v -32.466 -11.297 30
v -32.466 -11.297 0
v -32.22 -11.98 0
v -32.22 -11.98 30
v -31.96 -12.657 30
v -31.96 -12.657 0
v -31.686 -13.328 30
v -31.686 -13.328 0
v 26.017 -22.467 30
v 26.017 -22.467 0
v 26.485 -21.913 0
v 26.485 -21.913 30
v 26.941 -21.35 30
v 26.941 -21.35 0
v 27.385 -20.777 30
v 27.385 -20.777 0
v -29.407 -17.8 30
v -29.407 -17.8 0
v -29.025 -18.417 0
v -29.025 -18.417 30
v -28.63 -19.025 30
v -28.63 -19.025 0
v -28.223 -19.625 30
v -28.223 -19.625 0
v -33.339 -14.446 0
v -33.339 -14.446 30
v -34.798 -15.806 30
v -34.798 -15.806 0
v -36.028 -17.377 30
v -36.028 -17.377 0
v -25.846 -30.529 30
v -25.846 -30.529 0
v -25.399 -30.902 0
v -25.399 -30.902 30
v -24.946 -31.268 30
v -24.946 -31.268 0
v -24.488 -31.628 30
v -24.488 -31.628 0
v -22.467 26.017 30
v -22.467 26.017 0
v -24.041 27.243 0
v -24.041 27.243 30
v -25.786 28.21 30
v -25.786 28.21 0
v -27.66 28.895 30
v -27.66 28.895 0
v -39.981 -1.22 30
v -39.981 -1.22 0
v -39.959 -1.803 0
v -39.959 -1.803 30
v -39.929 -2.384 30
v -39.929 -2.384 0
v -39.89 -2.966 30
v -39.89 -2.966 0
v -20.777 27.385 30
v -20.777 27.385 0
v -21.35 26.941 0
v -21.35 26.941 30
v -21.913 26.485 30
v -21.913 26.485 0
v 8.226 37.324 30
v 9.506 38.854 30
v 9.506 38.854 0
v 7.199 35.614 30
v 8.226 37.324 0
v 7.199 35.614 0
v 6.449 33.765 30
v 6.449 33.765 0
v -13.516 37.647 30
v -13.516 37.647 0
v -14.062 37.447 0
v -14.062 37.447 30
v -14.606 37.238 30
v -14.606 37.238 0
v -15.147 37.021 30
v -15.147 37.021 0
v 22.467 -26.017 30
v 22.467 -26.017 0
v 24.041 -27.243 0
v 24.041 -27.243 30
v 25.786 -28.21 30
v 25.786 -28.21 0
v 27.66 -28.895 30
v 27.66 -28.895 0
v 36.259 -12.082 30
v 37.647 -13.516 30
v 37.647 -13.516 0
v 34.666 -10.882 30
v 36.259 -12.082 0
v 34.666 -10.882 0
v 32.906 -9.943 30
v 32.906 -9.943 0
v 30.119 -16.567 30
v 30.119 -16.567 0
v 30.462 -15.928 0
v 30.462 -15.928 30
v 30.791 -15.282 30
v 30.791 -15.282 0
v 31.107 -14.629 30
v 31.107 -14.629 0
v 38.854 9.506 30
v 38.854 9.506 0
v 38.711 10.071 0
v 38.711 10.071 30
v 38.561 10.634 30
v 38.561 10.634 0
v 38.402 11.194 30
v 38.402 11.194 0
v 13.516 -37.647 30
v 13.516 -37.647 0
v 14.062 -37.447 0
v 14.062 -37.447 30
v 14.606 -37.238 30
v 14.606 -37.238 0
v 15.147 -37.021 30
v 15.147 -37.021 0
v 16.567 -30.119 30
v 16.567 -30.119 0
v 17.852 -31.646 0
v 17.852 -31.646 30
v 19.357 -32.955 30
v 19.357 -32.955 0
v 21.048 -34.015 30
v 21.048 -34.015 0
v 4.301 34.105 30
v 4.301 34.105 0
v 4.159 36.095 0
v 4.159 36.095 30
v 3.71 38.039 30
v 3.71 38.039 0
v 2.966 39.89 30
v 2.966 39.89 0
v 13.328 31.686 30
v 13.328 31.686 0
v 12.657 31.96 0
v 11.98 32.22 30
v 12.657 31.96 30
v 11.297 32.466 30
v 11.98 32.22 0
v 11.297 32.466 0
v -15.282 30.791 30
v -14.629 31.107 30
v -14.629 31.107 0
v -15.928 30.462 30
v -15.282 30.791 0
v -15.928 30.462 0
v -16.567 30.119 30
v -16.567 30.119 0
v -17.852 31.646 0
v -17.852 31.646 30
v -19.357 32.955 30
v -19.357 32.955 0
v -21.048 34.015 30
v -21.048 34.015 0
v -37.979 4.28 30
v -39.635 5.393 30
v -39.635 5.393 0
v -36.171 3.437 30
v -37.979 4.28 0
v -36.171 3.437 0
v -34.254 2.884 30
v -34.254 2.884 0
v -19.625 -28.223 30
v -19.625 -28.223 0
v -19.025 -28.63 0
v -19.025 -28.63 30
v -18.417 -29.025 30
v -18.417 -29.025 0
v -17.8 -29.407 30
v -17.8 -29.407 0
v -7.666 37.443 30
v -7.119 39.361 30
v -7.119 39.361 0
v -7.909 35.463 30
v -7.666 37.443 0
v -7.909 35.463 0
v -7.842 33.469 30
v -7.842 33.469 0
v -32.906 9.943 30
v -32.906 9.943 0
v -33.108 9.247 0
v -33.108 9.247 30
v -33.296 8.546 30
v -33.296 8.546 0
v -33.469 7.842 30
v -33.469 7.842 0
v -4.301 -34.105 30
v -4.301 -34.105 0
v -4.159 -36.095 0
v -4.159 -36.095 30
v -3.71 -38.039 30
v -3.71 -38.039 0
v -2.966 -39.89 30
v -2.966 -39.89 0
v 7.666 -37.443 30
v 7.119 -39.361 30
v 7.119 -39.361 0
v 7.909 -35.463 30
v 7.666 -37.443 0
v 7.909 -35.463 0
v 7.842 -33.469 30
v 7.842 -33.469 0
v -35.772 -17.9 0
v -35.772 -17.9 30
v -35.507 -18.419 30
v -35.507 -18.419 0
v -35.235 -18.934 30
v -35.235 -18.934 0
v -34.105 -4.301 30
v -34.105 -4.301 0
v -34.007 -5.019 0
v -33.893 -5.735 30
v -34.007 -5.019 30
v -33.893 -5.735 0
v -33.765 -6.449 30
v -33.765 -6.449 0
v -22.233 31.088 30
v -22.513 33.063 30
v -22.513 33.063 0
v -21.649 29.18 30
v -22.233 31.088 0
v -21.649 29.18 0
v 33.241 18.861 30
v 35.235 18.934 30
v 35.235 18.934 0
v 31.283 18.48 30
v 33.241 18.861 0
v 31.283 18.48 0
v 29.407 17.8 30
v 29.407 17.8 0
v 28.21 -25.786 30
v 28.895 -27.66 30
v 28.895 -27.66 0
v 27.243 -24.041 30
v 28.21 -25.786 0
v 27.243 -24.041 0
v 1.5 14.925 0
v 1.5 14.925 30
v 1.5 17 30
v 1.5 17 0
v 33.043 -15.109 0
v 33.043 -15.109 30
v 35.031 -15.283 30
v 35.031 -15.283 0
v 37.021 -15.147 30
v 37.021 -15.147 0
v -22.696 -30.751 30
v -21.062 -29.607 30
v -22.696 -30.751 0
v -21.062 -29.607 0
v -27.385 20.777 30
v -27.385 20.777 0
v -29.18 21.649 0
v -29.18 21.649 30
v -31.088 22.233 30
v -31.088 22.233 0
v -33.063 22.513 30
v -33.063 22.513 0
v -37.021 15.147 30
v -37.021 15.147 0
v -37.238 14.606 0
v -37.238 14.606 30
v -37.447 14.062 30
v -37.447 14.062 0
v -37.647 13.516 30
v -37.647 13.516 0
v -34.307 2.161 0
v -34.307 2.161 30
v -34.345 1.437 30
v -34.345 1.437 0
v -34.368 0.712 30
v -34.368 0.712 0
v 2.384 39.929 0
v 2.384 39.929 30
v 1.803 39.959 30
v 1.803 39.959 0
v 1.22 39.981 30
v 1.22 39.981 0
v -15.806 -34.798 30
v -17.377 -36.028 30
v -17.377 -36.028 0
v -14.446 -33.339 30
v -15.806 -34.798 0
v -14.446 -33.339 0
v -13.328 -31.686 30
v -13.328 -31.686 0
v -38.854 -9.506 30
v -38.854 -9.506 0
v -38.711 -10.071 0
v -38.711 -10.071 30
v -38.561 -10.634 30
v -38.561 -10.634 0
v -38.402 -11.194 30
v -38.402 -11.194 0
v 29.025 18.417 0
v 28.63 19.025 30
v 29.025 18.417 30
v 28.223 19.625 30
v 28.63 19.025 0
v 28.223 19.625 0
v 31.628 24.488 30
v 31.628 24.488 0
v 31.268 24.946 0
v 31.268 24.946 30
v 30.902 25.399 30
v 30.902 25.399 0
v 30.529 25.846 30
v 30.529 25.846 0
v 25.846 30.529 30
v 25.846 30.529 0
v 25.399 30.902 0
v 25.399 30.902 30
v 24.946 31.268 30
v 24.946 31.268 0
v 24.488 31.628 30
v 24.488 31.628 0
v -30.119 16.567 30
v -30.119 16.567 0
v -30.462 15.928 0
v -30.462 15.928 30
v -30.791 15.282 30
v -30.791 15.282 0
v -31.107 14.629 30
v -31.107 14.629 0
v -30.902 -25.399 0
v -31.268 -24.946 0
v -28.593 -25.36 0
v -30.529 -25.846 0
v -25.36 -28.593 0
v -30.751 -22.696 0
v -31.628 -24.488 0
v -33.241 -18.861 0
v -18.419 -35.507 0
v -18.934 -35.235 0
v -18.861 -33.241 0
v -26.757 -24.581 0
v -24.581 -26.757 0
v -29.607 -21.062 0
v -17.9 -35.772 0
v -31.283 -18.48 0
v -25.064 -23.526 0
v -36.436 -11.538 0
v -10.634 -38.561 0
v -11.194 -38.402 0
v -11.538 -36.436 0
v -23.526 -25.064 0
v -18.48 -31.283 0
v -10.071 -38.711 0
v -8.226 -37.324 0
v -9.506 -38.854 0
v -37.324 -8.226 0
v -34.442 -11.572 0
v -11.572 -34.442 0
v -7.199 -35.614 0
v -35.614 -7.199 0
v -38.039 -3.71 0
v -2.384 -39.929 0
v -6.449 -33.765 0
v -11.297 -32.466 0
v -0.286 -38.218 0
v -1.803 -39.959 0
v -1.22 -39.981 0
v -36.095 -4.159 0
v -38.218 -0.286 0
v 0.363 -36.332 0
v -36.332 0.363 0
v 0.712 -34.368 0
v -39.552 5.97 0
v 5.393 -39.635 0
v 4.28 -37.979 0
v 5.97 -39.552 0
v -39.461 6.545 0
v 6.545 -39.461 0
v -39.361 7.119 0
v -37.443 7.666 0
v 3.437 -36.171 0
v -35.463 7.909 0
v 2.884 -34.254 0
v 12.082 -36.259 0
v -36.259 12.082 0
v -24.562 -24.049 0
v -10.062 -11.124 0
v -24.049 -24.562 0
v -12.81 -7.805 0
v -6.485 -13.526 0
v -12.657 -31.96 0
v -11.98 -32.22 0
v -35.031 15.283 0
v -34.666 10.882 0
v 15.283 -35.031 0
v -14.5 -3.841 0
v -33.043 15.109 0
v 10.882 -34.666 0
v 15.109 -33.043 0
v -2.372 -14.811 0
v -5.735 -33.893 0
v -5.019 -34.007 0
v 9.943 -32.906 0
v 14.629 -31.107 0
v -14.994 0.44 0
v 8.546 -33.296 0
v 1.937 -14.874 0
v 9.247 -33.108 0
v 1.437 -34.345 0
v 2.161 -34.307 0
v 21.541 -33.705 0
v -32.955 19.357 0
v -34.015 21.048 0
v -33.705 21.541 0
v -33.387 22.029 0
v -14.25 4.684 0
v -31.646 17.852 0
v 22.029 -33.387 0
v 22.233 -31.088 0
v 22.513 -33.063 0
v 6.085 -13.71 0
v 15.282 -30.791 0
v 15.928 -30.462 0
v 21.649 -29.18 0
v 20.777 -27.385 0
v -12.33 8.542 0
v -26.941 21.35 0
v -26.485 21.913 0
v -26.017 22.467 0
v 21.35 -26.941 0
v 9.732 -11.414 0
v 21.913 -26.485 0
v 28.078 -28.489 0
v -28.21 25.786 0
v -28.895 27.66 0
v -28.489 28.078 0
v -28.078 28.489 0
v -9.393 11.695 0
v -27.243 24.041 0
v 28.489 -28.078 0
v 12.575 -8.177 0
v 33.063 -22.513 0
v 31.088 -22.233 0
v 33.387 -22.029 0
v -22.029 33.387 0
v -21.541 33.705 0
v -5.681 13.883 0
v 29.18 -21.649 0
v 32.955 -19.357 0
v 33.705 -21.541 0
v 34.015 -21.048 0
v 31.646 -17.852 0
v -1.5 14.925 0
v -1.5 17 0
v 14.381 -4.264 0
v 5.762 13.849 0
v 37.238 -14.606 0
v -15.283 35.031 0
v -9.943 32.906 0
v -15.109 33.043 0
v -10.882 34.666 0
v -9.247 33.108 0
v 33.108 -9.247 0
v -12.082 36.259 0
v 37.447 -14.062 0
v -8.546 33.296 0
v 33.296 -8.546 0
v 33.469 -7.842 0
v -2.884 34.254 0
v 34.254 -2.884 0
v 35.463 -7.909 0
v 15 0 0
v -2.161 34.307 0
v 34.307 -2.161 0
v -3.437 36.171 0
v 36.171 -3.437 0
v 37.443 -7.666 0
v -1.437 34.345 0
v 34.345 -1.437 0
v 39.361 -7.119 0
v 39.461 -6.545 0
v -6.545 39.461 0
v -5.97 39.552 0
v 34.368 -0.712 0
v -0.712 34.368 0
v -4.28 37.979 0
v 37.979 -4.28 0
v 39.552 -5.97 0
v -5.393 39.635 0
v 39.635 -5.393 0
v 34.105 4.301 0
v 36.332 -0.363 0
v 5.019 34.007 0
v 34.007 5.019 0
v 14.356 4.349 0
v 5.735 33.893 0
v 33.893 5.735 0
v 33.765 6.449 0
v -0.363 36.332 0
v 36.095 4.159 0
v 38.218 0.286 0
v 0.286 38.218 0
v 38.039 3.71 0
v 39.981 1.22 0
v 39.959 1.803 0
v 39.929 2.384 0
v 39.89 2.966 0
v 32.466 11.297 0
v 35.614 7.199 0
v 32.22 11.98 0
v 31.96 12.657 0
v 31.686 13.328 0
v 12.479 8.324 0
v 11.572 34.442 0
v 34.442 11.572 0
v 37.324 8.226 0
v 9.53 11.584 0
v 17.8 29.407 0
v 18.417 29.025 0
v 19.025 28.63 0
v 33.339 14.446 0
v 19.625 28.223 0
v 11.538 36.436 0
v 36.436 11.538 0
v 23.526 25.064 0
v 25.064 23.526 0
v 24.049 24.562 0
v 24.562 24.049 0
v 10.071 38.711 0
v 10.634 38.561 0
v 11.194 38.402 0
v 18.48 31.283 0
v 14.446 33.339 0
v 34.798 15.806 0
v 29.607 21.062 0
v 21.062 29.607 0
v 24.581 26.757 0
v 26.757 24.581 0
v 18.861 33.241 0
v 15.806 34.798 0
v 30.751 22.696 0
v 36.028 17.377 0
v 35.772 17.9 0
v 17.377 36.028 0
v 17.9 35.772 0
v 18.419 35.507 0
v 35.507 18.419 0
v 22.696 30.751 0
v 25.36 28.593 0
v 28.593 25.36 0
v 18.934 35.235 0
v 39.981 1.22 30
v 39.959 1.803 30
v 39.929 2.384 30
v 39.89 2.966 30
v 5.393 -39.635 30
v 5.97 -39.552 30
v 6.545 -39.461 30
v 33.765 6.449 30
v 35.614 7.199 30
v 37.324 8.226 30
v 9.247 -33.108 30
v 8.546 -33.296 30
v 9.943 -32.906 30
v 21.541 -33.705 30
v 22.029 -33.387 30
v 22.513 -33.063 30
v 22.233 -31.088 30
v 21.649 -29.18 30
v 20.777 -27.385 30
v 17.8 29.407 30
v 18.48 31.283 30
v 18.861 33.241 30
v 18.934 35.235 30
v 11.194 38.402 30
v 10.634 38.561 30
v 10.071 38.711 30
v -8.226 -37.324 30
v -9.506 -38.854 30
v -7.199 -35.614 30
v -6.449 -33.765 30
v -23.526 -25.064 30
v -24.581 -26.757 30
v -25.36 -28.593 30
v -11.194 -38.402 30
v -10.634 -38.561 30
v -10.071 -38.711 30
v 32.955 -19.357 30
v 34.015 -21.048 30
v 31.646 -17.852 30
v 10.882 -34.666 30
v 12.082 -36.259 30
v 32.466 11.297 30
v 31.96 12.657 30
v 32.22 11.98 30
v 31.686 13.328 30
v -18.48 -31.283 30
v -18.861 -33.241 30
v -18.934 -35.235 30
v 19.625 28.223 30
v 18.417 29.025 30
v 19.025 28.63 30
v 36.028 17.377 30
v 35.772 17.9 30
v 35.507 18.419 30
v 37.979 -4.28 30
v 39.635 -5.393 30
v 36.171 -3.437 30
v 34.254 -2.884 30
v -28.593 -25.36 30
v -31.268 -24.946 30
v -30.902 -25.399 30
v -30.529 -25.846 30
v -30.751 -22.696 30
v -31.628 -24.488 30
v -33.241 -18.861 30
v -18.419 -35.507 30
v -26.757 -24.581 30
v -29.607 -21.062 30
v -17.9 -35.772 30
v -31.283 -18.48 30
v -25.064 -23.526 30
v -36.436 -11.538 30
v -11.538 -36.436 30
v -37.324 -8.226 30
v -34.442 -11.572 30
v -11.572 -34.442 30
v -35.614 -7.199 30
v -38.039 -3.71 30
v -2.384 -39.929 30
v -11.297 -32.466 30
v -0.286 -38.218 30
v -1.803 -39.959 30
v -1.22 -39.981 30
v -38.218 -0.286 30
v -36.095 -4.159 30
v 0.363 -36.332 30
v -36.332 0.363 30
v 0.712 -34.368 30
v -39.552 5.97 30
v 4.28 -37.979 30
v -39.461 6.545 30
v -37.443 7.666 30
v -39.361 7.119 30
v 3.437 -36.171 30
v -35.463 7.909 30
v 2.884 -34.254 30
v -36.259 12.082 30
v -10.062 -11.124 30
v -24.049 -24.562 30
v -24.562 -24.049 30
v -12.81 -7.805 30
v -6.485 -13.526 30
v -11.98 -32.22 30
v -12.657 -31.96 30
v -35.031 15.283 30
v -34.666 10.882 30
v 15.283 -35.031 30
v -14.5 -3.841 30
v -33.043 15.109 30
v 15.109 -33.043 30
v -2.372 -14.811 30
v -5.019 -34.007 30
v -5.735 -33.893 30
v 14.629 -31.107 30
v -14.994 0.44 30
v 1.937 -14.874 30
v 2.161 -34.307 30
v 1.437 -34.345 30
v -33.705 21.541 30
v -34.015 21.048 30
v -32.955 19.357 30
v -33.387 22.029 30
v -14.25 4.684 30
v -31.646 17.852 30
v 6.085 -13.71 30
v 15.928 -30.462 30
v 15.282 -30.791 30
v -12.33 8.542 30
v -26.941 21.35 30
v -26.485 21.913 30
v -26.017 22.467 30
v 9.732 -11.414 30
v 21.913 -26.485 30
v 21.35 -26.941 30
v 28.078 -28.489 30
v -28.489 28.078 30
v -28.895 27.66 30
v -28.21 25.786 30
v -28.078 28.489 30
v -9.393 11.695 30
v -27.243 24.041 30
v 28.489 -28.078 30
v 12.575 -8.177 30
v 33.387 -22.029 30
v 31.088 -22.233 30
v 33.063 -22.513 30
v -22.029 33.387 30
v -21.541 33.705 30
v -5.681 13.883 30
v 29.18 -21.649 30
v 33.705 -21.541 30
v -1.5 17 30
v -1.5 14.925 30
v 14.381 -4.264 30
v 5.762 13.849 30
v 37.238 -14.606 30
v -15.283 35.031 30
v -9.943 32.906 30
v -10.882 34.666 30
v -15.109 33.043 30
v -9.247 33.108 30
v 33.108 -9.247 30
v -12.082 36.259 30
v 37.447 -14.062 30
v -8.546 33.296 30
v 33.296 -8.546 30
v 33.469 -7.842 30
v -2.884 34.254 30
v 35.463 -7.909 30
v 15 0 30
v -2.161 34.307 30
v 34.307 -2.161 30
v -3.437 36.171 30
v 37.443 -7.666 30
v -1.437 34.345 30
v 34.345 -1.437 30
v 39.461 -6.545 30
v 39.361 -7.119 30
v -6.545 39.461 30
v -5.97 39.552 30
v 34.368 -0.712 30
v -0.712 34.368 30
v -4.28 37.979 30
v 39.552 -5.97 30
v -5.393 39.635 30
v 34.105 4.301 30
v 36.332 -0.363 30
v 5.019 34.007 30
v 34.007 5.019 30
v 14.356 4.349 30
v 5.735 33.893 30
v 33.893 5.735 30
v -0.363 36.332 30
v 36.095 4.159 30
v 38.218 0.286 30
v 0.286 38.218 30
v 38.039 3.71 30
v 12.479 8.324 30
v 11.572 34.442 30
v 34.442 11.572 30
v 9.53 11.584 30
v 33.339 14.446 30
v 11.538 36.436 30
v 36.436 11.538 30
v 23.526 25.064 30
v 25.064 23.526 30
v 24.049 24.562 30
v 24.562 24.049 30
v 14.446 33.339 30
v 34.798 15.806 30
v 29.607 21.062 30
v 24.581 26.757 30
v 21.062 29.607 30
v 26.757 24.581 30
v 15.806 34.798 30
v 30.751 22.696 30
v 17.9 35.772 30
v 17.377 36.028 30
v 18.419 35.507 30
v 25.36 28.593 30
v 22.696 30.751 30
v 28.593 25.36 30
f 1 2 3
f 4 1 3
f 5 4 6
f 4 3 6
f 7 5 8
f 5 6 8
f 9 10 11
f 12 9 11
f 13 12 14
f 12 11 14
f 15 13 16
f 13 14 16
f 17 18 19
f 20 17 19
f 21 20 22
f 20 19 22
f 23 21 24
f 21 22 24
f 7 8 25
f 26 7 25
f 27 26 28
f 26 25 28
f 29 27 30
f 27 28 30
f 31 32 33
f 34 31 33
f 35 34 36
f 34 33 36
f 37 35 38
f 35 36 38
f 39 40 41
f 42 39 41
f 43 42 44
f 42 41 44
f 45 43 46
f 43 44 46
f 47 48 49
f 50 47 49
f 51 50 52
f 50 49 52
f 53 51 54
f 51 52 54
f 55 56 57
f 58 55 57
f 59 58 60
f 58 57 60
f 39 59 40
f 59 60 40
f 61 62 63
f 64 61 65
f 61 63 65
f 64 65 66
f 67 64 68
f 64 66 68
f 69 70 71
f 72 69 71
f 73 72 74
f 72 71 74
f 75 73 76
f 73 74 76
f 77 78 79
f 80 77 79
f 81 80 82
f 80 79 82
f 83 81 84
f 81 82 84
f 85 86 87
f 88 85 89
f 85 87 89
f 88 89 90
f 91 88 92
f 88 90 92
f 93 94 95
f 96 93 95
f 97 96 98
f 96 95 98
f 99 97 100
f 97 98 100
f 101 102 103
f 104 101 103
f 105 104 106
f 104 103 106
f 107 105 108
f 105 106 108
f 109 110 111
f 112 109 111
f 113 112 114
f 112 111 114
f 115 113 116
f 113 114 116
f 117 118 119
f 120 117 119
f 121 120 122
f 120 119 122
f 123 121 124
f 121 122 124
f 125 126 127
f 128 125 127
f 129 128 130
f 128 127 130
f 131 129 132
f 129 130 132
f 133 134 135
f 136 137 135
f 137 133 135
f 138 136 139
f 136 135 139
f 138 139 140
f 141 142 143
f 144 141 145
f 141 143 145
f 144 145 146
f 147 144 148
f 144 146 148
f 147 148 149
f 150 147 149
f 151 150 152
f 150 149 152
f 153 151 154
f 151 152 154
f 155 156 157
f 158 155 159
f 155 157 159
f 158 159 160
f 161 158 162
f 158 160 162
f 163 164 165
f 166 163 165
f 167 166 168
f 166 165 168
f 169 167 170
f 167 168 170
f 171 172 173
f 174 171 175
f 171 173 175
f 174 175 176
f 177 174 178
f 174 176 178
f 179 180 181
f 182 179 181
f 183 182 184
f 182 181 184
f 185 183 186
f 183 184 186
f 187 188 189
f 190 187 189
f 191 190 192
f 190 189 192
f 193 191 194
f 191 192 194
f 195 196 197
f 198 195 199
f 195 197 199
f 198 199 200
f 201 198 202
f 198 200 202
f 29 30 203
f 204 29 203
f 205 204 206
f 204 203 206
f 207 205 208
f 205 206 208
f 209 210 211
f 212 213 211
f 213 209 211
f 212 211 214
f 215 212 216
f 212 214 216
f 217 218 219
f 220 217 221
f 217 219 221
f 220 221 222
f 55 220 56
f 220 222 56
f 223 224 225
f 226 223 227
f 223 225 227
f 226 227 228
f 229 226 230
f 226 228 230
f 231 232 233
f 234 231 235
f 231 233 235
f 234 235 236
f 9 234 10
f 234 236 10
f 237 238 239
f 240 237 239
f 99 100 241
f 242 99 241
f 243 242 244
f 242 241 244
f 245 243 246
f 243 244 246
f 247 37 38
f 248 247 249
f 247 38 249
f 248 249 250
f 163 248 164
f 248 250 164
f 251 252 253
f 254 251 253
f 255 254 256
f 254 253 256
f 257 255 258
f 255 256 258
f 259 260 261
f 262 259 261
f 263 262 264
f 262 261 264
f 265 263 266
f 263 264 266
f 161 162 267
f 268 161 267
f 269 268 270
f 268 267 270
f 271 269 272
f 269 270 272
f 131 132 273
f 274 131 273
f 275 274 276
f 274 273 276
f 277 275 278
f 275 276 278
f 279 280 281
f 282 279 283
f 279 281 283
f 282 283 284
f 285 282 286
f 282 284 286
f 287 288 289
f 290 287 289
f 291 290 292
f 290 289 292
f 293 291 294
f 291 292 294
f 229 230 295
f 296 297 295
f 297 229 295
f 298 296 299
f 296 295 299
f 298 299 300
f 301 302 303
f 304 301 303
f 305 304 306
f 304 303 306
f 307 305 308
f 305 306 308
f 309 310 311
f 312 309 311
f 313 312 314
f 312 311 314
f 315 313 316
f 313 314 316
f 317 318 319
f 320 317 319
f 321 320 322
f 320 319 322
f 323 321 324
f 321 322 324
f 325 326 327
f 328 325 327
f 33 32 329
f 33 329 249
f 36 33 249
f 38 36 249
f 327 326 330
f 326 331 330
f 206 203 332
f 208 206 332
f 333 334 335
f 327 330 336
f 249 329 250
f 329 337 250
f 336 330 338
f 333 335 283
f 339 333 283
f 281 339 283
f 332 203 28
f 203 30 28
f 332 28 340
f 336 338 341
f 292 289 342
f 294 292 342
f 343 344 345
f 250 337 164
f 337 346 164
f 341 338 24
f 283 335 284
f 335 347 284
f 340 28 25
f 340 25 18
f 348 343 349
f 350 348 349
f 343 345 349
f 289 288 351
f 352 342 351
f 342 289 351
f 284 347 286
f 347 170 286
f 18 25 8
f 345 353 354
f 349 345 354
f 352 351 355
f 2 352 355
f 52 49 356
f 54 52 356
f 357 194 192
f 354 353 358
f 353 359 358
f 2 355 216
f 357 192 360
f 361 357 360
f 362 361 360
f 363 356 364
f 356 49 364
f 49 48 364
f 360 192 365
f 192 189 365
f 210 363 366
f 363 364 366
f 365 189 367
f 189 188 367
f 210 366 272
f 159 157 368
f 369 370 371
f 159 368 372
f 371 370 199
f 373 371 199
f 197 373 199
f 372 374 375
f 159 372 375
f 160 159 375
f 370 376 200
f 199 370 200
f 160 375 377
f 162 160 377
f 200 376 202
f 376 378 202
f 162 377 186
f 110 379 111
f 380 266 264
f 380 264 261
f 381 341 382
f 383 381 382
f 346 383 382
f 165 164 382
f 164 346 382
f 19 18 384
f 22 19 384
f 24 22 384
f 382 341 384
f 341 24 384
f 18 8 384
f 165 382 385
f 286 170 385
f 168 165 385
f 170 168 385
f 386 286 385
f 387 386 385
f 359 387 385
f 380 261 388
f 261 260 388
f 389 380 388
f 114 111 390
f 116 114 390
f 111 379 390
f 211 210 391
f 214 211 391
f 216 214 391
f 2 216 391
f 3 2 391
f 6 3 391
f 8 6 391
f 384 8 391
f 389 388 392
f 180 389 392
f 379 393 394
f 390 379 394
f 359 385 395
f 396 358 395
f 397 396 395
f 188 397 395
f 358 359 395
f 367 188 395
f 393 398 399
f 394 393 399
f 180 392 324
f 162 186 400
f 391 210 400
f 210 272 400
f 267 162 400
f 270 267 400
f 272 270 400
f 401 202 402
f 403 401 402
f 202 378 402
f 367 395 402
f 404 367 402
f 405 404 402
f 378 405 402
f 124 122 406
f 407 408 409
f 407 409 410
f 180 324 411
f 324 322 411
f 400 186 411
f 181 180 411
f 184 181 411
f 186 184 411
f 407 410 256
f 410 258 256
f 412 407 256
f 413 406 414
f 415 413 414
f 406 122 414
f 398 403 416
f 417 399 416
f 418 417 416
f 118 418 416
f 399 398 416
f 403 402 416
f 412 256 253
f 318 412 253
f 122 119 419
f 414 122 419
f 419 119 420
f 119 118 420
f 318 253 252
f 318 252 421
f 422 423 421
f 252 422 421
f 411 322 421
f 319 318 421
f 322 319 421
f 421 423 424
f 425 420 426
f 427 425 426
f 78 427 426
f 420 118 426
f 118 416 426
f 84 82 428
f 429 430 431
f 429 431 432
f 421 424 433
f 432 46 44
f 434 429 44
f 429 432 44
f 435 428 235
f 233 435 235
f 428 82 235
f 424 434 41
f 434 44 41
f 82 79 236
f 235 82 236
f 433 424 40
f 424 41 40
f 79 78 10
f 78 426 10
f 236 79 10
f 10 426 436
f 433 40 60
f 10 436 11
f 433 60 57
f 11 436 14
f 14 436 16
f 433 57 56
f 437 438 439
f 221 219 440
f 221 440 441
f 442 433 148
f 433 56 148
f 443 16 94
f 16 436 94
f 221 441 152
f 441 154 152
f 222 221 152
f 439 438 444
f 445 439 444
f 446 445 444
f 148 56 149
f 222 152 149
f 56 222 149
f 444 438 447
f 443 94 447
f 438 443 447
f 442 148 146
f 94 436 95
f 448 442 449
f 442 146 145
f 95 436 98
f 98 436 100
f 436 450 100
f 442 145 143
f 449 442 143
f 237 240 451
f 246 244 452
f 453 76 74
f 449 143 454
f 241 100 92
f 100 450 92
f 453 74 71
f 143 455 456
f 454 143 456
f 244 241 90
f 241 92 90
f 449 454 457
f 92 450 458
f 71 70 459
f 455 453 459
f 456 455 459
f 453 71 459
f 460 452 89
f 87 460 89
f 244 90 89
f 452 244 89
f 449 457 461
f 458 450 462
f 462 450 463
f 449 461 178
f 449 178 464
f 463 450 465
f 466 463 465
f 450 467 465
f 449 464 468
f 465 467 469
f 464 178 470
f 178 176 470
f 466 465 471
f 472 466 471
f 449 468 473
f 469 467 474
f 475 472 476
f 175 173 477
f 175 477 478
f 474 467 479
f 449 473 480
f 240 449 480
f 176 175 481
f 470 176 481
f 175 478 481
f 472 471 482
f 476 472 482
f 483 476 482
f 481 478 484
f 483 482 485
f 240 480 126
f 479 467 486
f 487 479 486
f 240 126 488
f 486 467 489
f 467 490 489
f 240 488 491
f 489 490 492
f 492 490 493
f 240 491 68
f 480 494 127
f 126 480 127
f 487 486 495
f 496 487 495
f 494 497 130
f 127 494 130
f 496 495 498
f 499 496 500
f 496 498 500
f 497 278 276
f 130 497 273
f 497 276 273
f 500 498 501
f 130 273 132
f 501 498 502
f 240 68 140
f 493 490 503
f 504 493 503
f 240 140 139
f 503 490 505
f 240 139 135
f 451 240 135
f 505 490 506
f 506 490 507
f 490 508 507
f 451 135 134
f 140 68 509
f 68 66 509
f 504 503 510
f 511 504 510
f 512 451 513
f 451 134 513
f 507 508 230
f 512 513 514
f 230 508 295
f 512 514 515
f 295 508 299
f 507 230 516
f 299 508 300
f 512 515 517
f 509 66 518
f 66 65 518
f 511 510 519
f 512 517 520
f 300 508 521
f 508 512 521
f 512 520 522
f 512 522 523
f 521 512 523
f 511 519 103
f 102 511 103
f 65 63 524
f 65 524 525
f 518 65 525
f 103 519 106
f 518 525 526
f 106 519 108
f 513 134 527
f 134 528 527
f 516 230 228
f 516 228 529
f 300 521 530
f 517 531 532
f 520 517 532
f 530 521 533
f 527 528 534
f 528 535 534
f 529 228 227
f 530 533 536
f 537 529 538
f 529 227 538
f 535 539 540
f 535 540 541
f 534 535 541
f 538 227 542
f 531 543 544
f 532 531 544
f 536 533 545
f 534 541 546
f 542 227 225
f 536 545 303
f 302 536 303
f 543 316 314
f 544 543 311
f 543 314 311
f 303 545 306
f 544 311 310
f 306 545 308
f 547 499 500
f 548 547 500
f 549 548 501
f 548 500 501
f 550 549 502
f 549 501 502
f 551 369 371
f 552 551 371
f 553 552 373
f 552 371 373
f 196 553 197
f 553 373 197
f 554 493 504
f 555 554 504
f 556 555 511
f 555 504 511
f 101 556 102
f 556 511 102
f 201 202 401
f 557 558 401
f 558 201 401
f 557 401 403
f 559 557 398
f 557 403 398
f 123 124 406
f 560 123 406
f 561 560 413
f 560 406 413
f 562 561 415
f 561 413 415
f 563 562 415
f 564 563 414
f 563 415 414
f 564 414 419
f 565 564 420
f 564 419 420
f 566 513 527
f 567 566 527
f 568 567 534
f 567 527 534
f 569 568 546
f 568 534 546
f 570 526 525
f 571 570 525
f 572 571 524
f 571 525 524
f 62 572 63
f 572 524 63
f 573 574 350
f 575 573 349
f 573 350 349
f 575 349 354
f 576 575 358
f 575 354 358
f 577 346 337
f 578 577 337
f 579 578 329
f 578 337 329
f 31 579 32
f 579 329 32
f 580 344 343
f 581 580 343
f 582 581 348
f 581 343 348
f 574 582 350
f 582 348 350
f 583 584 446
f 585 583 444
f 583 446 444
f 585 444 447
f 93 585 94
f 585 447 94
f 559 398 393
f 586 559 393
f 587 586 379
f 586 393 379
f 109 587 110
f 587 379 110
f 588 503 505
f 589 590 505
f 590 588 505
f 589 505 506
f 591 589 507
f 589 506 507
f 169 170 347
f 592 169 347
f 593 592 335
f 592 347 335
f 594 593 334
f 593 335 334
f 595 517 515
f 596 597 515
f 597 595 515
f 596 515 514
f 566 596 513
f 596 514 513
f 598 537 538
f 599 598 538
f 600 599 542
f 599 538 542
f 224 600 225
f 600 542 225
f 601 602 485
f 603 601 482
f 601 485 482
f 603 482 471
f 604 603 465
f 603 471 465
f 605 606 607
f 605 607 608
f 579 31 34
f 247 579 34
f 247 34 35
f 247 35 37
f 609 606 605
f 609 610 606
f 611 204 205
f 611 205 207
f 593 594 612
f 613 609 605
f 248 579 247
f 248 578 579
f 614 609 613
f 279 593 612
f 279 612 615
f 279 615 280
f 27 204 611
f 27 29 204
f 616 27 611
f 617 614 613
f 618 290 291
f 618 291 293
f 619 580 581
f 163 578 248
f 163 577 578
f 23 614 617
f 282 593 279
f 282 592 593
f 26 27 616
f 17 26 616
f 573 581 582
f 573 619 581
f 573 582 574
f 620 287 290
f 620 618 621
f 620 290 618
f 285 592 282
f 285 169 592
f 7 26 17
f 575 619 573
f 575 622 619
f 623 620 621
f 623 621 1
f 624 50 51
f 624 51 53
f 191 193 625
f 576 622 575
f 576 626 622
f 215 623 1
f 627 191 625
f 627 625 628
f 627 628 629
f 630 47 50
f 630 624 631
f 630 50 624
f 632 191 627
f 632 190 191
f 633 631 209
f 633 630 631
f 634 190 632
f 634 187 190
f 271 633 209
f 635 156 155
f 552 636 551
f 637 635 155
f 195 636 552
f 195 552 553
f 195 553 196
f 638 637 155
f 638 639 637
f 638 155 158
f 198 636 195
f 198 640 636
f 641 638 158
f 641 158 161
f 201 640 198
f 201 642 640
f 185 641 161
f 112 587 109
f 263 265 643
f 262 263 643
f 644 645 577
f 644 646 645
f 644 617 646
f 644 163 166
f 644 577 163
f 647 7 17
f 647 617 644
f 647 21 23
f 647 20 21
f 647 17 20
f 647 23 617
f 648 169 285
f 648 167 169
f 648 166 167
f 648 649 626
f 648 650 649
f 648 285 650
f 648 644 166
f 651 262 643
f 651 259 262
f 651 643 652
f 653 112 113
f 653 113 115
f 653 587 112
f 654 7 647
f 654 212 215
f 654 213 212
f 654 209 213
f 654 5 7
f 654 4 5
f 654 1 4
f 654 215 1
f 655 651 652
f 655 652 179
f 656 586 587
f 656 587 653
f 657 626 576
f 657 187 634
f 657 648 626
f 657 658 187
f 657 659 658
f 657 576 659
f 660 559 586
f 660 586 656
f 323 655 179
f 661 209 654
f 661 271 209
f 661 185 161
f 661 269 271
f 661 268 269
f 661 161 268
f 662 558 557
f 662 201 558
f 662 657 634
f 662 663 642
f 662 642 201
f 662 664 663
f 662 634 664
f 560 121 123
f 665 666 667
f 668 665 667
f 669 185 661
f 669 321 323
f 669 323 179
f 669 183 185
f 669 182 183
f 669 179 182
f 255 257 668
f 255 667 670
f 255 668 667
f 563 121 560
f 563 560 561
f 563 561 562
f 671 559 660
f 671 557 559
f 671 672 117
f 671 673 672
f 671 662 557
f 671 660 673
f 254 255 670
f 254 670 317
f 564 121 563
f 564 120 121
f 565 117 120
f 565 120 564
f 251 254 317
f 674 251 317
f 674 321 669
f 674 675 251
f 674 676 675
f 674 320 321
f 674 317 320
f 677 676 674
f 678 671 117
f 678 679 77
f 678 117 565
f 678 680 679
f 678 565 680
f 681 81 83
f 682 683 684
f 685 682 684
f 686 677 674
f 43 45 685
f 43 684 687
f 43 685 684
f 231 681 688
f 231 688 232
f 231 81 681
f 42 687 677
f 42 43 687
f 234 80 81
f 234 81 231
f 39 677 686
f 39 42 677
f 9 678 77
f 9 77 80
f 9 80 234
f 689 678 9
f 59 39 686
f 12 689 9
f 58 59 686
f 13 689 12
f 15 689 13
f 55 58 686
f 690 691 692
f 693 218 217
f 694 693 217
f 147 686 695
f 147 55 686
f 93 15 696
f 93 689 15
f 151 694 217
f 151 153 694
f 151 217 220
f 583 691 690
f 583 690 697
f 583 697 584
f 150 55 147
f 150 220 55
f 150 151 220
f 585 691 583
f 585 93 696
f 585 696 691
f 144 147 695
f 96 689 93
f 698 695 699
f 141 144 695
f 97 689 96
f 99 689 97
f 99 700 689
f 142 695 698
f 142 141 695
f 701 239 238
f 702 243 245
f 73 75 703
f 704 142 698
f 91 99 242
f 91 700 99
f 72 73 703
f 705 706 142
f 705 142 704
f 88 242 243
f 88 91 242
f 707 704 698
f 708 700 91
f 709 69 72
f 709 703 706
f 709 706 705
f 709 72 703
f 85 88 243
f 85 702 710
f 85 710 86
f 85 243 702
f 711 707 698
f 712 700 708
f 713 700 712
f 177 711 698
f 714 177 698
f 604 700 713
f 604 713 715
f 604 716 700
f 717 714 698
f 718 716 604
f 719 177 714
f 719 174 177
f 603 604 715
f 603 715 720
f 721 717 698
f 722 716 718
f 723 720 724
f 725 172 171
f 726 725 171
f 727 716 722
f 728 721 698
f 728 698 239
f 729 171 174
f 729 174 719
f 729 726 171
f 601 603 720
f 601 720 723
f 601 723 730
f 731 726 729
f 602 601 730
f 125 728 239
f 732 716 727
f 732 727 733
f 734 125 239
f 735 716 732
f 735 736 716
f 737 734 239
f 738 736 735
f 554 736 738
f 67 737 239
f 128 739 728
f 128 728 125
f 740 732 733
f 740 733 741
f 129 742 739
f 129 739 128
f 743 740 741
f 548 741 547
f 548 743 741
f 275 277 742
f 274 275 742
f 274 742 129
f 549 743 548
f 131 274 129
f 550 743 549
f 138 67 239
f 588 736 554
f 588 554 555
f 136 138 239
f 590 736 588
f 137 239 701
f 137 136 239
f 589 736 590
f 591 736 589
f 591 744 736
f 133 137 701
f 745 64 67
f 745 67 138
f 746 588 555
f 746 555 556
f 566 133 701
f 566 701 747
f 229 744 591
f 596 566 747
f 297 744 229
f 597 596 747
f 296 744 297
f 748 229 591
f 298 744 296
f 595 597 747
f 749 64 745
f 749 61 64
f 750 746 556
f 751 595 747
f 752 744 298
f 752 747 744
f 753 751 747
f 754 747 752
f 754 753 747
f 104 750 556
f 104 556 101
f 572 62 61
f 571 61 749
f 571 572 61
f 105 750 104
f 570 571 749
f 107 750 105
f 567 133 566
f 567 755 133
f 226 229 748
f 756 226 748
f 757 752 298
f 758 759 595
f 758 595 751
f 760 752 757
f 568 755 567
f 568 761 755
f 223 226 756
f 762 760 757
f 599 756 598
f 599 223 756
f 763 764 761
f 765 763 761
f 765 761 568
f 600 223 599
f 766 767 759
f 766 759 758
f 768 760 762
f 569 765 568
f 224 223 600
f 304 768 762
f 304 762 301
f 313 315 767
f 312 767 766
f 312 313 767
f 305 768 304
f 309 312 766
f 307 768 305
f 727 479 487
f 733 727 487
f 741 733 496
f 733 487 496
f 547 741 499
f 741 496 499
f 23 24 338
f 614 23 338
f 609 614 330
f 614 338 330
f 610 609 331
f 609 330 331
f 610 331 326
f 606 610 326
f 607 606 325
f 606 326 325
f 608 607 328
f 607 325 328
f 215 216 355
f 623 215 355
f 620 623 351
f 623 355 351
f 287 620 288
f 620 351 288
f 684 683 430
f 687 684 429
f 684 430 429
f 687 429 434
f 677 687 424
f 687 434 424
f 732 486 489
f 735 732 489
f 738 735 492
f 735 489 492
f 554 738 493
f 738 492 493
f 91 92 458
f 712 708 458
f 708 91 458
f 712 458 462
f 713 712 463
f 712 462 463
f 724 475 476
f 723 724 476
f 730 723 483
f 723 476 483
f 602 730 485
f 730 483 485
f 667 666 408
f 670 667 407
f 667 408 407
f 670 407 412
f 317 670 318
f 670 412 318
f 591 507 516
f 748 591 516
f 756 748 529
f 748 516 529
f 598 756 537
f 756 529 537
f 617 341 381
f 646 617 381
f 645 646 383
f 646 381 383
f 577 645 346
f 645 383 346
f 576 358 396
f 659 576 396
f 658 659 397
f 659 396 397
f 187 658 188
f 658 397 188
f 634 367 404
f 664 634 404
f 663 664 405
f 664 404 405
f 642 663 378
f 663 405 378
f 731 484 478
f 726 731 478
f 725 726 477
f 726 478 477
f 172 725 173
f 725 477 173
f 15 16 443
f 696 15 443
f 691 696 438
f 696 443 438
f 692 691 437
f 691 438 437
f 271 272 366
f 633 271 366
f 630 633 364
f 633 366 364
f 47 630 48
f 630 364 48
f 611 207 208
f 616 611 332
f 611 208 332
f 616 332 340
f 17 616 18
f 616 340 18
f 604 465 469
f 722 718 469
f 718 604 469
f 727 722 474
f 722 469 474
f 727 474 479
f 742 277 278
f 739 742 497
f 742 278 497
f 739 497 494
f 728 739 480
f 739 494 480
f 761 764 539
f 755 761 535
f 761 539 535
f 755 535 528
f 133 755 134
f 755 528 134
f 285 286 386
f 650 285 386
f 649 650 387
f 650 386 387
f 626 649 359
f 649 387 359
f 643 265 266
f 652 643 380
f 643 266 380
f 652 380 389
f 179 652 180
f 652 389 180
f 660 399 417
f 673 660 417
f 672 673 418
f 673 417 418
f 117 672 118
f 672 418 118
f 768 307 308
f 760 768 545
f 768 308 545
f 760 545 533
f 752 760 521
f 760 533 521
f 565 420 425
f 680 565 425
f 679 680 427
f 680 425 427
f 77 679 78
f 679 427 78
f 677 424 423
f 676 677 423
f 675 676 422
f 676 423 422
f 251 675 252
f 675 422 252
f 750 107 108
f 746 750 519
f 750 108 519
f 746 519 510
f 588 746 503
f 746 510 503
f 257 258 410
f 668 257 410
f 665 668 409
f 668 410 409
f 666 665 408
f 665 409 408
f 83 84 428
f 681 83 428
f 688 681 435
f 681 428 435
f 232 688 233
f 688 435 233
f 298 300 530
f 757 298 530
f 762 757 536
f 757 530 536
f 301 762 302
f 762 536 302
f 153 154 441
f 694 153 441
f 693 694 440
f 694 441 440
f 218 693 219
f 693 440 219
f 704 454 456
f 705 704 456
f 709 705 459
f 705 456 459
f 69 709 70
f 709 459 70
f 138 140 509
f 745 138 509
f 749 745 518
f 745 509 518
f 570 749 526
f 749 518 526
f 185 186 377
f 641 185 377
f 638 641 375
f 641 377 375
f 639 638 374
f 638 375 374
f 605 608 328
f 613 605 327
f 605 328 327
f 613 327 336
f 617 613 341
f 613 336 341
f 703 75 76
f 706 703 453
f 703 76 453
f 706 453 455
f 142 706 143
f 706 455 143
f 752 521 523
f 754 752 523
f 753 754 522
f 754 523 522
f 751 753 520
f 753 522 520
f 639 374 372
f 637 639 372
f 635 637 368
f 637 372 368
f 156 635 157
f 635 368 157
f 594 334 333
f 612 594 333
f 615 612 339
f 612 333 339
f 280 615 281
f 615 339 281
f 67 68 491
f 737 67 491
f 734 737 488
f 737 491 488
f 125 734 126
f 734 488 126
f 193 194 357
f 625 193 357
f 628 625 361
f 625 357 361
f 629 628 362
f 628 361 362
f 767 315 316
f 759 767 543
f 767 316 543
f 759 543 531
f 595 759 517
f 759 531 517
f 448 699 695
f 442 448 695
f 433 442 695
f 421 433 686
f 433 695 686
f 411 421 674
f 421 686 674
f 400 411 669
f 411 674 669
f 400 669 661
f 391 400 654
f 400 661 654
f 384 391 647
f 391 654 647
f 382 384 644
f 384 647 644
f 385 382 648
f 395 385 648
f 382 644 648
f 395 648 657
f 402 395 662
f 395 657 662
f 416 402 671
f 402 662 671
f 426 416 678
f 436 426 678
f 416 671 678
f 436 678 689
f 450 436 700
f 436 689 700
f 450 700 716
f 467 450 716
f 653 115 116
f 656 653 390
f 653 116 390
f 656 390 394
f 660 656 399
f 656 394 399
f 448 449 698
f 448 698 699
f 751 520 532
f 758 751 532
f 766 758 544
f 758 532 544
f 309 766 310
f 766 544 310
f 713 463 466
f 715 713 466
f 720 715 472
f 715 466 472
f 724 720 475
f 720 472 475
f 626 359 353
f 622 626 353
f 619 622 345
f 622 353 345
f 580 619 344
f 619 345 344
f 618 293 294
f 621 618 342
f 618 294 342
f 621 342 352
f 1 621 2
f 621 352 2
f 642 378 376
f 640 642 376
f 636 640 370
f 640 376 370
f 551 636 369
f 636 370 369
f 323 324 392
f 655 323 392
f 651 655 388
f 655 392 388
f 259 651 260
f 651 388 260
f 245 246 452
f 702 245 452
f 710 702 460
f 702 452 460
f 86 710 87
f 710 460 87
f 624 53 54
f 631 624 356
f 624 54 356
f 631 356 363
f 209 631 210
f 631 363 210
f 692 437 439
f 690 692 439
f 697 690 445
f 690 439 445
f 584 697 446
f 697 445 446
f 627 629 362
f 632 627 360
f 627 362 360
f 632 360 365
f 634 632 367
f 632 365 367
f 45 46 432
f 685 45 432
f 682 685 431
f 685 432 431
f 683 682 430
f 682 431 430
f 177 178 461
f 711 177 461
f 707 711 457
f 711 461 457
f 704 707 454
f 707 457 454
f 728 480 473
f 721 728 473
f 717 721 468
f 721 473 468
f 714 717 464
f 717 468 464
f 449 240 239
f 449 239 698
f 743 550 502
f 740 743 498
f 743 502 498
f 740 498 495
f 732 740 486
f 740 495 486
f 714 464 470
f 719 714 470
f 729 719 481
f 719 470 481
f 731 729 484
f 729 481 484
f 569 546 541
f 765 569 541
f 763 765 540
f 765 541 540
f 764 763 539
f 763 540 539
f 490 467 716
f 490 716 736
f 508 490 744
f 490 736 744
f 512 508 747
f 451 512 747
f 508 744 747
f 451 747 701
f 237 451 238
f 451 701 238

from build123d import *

# Parameters (mm, degrees)
SKETCH_1_R               = 34.375
EXTRUDE_1_DEPTH          = 30
EXTRUDE_START            = -30
EXTRUDE_2_DEPTH          = 30
PATTERN_CIRCULAR_1_COUNT = 30
CUT_EXTRUDE_1_DEPTH      = 30


with BuildPart() as part:
    # 草图1 → 凸台-拉伸1 (new body)
    with BuildSketch(Plane.XY):
        Circle(SKETCH_1_R)
    extrude(amount=EXTRUDE_1_DEPTH)

    # 草图2 → 凸台-拉伸2 (add)
    with BuildSketch(Plane.XY.offset(30).offset(EXTRUDE_START)):
        with BuildLine():
            ThreePointArc((2.965504601, 39.889920813), (2.09343825, 39.94518139), (1.220372866, 39.981379292))
            ThreePointArc((1.220372866, 39.981379292), (-0.075113847, 37.287853424), (-0.712008739, 34.367625297))
            ThreePointArc((-0.712008739, 34.367625297), (1.799048496, 34.327890257), (4.300503339, 34.10493067))
            ThreePointArc((4.300503339, 34.10493067), (3.972344382, 37.075735127), (2.965504601, 39.889920813))
        make_face()
    extrude_2 = extrude(amount=EXTRUDE_2_DEPTH)

    # 阵列(圆周)1: 凸台-拉伸2 ×30 about axis
    pattern_circular_1_axis = Axis((0, 0, 0), (0, 0, 1))
    for i in range(1, PATTERN_CIRCULAR_1_COUNT):
        add(extrude_2.rotate(pattern_circular_1_axis, i * 360 / PATTERN_CIRCULAR_1_COUNT))

    # 草图3 → 切除-拉伸1 (cut)
    with BuildSketch(Plane.XY.offset(30)):
        with BuildLine():
            Line((-1.5, 14.924811557), (-1.5, 0))
            Line((-1.5, 0), (1.5, 0))
            Line((1.5, 0), (1.5, 14.924811557))
            ThreePointArc((1.5, 14.924811557), (0, 15), (-1.5, 14.924811557))
        make_face()
        with BuildLine():
            Line((1.5, 0), (-1.5, 0))
            Line((-1.5, 0), (-1.5, 14.924811557))
            ThreePointArc((-1.5, 14.924811557), (-10.062305899, -11.124297731), (15, 0))
            ThreePointArc((15, 0), (11.124297731, 10.062305899), (1.5, 14.924811557))
            Line((1.5, 14.924811557), (1.5, 0))
        make_face()
        with BuildLine():
            Line((-1.5, 17), (-1.5, 14.924811557))
            ThreePointArc((-1.5, 14.924811557), (0, 15), (1.5, 14.924811557))
            Line((1.5, 14.924811557), (1.5, 17))
            Line((1.5, 17), (-1.5, 17))
        make_face()
    extrude(amount=-CUT_EXTRUDE_1_DEPTH, mode=Mode.SUBTRACT)


solid = part.part
